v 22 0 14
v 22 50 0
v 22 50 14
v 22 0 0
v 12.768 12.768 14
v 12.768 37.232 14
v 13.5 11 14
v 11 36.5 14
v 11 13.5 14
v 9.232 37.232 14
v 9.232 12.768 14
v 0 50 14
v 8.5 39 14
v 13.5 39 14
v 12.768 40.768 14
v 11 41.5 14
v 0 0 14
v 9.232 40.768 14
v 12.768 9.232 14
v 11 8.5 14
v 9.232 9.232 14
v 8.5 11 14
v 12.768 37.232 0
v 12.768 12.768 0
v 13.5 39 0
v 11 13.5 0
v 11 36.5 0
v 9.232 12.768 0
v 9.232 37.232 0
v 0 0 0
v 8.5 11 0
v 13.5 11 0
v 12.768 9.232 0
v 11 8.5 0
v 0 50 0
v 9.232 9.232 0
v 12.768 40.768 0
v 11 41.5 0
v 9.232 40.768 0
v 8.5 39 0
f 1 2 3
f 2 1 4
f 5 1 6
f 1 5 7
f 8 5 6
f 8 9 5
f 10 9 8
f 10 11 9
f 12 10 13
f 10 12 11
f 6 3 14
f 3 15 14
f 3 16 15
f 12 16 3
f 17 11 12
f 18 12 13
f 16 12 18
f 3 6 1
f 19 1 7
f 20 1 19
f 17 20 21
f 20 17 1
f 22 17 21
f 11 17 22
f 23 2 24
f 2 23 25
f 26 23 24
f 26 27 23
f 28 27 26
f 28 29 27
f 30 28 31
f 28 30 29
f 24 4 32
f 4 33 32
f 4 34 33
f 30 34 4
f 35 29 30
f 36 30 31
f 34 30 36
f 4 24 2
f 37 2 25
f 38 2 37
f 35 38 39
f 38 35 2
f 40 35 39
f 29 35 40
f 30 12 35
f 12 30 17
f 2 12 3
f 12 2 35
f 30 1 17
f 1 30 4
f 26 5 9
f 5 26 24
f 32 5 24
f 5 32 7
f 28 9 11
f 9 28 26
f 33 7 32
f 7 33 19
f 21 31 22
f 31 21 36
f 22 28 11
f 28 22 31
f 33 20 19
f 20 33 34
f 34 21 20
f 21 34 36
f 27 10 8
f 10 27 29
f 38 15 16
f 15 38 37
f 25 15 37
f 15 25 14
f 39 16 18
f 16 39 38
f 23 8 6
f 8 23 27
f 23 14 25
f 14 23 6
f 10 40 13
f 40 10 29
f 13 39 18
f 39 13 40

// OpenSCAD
difference(){
    a=22;
    b=50;
    cube([a,b,14]);
    
    translate([a/2,a/2,-1]) cylinder(h=16, r=2.5);
    translate([a/2,b-a/2,-1]) cylinder(h=16, r=2.5);
}
